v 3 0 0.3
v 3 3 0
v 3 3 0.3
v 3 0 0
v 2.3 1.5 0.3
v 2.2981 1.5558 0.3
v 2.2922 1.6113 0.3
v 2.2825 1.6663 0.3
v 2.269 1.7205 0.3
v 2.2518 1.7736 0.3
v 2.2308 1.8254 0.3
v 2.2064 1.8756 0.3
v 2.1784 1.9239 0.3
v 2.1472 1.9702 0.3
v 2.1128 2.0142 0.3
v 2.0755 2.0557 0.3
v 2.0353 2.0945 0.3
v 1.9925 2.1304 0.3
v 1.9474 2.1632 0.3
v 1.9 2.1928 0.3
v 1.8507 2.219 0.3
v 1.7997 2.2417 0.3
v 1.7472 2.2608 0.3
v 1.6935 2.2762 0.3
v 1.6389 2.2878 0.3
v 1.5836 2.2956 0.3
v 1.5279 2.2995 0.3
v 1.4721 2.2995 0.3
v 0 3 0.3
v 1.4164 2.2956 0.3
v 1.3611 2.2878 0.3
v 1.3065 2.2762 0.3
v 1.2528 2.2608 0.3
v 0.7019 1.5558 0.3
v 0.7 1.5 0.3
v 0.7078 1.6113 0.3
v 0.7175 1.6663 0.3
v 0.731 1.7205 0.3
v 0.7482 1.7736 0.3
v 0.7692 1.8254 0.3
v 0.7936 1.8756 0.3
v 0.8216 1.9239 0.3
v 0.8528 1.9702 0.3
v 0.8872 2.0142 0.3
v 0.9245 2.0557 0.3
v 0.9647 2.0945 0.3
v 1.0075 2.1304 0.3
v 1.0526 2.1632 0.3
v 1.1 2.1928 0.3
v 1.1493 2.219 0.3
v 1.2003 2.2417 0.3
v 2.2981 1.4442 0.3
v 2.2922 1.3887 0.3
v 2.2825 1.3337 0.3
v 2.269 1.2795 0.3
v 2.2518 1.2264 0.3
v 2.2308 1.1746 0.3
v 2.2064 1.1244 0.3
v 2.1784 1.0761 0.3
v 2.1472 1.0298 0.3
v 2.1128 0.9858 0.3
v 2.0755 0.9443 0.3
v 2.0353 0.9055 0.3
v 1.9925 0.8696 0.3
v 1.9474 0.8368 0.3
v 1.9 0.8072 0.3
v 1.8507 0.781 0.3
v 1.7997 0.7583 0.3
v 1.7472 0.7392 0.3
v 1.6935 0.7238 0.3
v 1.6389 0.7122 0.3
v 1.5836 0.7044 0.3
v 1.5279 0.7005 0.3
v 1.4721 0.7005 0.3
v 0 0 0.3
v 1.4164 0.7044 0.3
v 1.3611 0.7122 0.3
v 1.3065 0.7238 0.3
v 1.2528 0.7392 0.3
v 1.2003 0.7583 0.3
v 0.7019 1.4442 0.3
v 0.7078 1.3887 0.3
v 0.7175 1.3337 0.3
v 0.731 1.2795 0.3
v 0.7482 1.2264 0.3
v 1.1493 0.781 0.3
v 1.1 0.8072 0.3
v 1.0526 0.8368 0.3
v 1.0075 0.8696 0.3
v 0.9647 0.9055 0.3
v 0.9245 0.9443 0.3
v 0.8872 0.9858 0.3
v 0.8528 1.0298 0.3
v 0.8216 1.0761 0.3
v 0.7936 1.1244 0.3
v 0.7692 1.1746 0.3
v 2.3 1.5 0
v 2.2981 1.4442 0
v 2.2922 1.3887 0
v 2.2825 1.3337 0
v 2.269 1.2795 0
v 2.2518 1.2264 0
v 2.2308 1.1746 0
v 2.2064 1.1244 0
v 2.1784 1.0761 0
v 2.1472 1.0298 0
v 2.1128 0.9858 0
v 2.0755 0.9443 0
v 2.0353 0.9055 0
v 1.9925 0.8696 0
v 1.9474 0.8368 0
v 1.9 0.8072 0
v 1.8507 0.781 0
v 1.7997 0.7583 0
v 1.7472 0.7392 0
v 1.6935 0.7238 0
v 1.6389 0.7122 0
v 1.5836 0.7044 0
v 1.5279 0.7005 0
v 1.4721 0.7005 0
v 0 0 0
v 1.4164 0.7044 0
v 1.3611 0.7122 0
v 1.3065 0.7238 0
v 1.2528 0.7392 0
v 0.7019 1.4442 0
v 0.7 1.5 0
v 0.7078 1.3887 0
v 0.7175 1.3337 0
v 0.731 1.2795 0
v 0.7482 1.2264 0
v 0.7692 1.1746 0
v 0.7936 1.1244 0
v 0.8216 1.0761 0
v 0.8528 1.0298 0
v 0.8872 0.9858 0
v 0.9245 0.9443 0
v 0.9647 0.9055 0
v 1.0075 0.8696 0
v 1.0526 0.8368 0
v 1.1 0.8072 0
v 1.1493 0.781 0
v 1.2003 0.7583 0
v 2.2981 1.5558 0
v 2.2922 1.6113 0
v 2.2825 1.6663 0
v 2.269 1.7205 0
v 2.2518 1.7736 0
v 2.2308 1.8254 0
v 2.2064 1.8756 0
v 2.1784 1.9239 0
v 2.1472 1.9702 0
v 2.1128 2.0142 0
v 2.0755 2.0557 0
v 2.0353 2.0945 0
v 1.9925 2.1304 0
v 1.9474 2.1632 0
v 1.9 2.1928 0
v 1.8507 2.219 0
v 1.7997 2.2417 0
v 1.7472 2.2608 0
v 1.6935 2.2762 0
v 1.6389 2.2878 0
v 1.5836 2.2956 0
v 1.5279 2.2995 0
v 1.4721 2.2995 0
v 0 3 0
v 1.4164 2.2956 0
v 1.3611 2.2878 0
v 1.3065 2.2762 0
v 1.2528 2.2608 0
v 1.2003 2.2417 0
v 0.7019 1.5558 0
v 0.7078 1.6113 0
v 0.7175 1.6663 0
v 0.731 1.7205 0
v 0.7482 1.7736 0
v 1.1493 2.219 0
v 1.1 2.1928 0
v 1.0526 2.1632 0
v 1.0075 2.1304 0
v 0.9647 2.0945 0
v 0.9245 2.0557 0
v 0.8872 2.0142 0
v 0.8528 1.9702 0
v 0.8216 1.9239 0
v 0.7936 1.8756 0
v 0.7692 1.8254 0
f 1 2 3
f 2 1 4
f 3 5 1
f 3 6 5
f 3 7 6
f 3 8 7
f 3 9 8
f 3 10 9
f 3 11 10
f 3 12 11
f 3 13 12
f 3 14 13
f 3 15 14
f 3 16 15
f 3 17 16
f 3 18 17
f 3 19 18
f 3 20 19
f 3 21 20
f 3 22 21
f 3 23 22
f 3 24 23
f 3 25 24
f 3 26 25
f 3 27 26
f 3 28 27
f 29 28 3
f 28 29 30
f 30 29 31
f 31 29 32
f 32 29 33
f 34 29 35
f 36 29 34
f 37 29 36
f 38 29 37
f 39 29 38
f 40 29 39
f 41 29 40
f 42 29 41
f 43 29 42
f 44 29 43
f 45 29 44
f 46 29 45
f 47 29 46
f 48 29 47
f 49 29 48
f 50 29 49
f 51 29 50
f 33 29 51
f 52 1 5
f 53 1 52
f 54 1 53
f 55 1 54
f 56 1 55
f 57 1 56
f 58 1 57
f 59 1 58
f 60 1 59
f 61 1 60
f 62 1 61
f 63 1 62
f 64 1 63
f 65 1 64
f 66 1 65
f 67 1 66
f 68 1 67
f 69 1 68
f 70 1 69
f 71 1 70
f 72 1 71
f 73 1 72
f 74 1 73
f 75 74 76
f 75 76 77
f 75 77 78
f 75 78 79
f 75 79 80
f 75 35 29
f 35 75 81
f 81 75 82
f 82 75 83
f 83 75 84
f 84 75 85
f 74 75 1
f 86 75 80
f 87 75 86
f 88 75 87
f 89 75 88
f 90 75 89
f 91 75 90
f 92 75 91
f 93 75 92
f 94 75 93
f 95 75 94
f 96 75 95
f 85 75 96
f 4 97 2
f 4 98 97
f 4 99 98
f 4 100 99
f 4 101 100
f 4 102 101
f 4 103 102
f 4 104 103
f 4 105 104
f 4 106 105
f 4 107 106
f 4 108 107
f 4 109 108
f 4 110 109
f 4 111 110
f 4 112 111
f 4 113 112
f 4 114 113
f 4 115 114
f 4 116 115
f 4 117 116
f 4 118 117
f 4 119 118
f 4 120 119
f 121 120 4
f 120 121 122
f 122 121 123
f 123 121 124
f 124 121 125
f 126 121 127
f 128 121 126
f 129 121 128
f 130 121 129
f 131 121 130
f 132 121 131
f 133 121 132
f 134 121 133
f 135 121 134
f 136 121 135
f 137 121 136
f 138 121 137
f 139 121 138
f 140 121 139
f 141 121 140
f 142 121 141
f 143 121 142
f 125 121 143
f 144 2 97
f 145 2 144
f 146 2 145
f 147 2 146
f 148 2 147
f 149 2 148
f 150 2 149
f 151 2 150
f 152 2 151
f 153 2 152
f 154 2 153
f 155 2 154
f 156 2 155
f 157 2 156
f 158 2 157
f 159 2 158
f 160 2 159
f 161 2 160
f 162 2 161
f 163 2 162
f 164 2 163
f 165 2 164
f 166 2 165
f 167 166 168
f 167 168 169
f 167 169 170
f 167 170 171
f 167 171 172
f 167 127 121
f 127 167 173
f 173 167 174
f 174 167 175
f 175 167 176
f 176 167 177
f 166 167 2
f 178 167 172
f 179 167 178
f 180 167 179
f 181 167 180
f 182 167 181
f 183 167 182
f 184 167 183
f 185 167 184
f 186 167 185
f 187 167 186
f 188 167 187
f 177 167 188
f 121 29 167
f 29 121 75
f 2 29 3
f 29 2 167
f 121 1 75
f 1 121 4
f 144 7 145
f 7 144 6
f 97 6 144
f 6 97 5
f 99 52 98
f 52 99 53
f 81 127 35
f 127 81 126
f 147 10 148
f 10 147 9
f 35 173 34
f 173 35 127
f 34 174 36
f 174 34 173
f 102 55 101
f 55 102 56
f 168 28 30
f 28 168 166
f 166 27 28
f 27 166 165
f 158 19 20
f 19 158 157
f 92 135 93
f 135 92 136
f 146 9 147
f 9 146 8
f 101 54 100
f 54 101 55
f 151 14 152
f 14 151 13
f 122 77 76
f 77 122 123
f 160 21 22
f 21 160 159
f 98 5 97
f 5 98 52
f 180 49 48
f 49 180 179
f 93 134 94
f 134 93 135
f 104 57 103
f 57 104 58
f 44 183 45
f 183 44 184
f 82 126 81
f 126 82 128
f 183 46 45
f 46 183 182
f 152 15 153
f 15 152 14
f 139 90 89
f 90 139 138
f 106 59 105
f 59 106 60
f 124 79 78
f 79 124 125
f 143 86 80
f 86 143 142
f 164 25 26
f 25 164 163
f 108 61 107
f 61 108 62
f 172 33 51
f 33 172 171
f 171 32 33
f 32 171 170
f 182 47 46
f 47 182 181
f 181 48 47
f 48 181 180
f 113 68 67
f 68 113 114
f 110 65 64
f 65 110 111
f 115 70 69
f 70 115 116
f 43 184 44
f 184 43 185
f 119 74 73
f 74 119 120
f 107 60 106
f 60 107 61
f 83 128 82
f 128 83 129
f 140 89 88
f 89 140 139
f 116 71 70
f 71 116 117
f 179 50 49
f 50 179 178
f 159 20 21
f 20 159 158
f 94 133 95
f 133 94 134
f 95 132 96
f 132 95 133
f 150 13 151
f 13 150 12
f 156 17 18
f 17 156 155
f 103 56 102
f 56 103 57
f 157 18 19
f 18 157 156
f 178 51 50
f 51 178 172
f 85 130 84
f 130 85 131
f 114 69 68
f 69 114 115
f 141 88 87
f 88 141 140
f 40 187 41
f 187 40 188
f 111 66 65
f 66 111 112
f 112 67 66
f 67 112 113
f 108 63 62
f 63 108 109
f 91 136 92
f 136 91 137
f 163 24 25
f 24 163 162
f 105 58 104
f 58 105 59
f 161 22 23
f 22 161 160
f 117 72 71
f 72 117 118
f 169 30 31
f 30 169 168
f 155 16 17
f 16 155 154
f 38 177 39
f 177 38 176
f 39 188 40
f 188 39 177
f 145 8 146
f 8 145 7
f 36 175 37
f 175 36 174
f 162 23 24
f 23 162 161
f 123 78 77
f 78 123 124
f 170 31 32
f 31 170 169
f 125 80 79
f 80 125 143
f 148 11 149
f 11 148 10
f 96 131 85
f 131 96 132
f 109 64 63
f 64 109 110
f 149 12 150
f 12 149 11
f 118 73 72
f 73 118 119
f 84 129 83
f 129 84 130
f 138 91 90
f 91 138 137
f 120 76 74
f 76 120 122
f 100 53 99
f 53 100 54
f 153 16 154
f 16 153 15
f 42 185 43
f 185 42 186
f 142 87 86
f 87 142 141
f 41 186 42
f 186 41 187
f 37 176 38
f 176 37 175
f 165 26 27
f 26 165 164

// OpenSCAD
difference() {
    cube([3,3,0.3]);
    translate([1.5,1.5,-0.2]) {
        cylinder(2,0.8,0.8, $fn=90);
    }
}
